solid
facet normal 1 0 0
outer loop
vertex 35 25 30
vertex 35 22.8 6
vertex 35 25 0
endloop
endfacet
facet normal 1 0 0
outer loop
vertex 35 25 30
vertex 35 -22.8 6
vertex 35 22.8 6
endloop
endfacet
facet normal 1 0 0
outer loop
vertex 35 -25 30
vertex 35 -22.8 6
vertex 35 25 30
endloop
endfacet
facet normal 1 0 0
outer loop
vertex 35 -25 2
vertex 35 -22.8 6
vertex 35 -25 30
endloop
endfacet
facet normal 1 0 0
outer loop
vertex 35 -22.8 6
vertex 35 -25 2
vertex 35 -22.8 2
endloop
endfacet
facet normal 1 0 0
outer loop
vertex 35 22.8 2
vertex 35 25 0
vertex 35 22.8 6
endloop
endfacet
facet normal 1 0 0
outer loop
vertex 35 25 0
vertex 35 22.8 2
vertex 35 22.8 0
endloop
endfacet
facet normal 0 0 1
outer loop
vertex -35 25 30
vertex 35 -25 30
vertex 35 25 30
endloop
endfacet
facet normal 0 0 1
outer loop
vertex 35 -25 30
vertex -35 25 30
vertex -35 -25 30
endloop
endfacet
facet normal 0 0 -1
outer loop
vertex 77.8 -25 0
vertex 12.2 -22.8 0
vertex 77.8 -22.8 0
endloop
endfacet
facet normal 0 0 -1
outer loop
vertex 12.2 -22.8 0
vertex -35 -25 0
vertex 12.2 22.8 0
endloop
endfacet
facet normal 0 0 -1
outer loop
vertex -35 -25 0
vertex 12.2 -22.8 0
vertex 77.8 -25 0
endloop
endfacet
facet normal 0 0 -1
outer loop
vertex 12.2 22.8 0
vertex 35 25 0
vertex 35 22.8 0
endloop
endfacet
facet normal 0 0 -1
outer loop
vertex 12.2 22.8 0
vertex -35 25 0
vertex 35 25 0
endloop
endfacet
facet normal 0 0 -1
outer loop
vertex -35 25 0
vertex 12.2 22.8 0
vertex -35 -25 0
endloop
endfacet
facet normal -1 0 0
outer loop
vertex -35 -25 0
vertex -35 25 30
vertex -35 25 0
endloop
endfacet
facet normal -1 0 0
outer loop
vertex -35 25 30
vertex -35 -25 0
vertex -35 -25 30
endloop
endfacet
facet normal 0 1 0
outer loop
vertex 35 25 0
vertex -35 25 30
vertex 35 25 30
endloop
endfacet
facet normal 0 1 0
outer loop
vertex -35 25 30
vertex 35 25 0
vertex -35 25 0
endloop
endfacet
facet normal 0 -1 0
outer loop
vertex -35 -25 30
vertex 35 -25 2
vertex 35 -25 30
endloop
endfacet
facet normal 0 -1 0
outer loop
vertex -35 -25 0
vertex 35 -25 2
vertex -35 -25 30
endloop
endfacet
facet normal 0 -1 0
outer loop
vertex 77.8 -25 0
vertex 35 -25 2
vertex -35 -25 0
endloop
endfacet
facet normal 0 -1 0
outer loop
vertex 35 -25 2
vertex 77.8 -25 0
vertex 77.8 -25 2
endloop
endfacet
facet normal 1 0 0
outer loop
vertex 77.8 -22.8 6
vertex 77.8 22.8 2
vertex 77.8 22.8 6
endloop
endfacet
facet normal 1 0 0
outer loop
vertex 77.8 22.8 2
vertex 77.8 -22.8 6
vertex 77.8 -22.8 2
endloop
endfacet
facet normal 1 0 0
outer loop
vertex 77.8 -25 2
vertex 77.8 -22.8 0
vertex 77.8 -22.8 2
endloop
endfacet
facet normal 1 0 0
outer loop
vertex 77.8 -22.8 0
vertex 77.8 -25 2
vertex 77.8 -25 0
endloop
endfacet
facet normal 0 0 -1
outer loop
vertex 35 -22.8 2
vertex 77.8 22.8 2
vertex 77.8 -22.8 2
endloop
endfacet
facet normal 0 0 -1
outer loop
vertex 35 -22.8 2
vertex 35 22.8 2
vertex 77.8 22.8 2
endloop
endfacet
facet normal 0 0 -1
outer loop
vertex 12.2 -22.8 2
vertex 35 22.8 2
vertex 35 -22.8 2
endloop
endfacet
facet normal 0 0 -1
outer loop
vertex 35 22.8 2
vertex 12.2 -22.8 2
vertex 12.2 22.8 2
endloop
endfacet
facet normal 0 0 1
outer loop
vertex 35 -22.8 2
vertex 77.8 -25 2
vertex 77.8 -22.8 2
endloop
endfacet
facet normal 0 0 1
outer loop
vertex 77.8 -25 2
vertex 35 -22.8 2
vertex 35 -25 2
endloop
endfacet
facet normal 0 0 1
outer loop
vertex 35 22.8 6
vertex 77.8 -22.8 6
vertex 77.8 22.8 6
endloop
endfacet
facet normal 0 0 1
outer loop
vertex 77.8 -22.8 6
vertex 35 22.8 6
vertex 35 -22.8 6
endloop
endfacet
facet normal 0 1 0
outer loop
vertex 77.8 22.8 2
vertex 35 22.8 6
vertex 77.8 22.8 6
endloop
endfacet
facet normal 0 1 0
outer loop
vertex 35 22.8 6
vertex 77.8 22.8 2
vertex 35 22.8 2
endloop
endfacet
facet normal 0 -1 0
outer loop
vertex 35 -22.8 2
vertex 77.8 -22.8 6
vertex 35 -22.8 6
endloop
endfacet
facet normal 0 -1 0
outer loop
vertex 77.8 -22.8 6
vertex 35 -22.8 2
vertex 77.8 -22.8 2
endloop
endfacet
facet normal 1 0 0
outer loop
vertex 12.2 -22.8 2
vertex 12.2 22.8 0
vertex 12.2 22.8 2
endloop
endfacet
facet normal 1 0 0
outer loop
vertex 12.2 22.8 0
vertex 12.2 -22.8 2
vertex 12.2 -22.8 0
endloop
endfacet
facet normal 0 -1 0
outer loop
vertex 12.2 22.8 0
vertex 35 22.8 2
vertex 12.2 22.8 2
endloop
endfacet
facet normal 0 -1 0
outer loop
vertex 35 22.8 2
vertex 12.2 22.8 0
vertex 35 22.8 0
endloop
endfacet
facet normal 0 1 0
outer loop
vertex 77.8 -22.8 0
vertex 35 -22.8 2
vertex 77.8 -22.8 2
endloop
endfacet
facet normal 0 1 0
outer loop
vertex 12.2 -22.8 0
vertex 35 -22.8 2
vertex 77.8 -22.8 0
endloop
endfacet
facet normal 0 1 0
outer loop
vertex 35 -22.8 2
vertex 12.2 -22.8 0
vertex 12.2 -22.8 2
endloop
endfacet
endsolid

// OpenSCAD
// Two-part enclosure for a small electronics board (e.g., Arduino-based temperature logger)
// Print orientation: box standing on the bed, lid printed upside down on the +X side

// ---------- Parameters ----------
box_x      = 70;    // box outer size in X (mm)
box_y      = 50;    // box outer size in Y (mm)
box_z      = 30;    // box outer size in Z (mm)
box_wall   = 2;     // box wall thickness (mm)
box_floor  = 2;     // box floor thickness (mm)

lip_x      = 65.6;  // lip outer size in X (mm)
lip_y      = 45.6;  // lip outer size in Y (mm)
lip_t      = 1.5;   // lip wall thickness (mm)
lip_h      = 4;     // lip height above plate (mm)

eps        = 0.5;   // cutter overshoot past faces (mm)
gap        = 10;    // gap between the two parts (mm)

$fn = 64;

// ---------- Derived ----------
box_inner_x = box_x - 2 * box_wall;
box_inner_y = box_y - 2 * box_wall;
box_inner_z = box_z - box_floor;   // open top

plate_t = 2;        // lid plate thickness (mm)

// ---------- Model ----------
difference() {
    union() {
        // Box body (includes floor, open top)
        translate([-box_x / 2, -box_y / 2, 0])
            cube([box_x, box_y, box_z]);

        // Lid: plate + centred rectangular lip
        translate([(box_x - lip_x) / 2 + gap, -box_y / 2, 0])
            cube([lip_x, lip_y, plate_t]);

        translate([(box_x - lip_x) / 2 + gap, -lip_y / 2, plate_t])
            cube([lip_x, lip_y, lip_h]);
    }

    // Lip cutter: sink the lip into the plate so the union is not coplanar
    translate([(box_x - lip_x) / 2 + gap, -lip_y / 2, -eps])
        cube([lip_x, lip_y, plate_t + eps]);
}
